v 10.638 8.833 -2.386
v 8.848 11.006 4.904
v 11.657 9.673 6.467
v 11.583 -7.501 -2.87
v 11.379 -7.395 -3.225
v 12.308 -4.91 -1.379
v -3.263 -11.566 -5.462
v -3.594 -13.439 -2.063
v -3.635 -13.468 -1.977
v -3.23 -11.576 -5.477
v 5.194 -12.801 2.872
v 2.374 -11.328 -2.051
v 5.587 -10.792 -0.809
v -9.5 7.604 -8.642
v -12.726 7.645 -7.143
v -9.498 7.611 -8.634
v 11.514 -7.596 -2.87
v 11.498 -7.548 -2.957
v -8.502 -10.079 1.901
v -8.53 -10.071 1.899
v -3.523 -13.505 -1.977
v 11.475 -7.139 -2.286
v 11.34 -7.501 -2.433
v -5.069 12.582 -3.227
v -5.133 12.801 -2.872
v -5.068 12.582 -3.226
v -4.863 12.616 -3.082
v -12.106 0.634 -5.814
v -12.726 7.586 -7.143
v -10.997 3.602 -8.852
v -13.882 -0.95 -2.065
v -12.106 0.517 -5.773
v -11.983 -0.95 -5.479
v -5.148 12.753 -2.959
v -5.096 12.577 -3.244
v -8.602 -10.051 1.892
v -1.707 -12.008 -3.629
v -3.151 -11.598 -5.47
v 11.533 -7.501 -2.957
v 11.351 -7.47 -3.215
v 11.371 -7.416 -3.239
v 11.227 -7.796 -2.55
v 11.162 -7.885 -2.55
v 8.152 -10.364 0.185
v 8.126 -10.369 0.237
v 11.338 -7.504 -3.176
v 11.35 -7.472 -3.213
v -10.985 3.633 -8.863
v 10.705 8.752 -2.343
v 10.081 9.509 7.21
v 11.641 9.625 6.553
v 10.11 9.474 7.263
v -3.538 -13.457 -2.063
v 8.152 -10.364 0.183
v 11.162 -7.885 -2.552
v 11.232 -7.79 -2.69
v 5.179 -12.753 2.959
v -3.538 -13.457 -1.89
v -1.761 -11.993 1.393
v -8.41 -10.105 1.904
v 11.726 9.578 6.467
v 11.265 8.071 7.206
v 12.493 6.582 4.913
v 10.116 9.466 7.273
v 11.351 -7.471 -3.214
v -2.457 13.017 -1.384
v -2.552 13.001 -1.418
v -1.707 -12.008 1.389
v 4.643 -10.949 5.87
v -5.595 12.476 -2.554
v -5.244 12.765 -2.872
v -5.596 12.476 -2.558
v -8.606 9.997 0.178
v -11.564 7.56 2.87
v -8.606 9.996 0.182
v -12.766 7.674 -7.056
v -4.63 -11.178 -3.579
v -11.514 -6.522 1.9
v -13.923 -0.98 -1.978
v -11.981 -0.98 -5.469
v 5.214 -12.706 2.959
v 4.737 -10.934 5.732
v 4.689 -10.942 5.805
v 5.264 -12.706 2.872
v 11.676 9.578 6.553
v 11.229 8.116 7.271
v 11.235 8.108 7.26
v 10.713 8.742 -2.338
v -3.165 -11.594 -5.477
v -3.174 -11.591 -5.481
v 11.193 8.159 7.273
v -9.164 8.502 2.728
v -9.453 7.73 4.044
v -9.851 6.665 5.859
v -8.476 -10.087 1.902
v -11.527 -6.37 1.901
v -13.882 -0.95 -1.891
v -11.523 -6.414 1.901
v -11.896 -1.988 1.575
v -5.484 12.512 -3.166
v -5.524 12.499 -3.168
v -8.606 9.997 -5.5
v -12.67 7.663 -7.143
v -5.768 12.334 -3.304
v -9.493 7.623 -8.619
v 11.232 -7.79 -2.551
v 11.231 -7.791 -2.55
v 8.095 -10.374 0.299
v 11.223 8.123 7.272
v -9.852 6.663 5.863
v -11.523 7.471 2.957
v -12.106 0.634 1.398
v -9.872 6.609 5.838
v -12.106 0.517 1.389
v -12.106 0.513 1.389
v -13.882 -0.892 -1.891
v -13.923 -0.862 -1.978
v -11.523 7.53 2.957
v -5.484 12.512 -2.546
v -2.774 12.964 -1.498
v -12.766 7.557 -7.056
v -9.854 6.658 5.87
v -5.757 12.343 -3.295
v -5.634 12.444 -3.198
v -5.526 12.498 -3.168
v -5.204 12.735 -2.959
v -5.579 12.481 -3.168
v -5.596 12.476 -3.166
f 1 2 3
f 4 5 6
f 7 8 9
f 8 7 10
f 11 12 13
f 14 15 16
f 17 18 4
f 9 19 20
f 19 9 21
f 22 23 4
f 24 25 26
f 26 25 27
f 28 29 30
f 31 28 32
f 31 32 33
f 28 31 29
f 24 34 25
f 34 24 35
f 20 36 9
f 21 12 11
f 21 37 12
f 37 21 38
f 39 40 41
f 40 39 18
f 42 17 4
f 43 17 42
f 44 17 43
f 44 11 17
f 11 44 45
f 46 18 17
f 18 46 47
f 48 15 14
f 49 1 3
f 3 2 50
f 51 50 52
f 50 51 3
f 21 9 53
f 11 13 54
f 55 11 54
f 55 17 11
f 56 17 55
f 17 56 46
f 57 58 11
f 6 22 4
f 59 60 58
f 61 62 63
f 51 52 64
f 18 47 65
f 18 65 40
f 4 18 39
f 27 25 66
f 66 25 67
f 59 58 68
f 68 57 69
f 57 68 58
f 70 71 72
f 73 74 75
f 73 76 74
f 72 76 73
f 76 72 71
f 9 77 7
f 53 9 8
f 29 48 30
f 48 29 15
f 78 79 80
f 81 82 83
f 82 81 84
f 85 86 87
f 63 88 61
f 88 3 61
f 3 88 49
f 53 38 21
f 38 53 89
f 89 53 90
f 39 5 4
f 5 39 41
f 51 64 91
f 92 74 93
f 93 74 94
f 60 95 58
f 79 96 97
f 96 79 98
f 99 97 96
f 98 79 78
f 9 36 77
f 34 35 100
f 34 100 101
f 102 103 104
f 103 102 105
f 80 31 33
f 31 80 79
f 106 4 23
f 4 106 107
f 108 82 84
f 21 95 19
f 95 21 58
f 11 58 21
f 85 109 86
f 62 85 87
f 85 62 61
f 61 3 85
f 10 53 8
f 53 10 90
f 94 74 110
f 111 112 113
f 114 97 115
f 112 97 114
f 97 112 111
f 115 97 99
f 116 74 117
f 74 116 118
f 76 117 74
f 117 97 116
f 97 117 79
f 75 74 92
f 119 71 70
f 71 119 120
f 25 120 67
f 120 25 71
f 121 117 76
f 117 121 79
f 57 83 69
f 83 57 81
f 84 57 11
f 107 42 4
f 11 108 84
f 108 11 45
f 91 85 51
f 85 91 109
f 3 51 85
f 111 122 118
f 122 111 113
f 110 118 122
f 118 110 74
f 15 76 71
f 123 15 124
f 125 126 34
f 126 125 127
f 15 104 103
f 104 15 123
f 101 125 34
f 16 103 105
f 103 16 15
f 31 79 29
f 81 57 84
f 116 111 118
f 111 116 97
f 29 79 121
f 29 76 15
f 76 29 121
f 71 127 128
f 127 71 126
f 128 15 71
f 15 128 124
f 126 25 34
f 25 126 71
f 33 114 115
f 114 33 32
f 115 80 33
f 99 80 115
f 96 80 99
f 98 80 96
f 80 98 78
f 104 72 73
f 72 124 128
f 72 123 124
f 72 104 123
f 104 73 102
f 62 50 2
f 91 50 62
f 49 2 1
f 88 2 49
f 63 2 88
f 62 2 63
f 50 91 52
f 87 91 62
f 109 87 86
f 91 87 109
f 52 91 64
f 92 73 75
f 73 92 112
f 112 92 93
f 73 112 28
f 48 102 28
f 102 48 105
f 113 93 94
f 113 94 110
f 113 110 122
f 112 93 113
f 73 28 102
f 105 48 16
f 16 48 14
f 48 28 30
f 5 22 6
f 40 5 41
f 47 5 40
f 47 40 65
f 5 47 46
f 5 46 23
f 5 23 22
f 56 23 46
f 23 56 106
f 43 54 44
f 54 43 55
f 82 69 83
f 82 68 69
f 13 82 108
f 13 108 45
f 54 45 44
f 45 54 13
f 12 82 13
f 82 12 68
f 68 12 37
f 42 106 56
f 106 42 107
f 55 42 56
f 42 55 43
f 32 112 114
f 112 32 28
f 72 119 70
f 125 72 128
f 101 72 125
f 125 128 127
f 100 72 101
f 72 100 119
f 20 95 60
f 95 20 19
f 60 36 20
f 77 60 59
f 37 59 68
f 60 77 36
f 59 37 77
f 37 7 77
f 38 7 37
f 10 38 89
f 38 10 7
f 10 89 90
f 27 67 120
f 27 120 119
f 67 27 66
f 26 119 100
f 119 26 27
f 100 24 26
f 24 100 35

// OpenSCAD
// Auto-generated OpenSCAD file

    inner_points = 10*[[-0.4820813211250987, -1.0449238650604131, -0.5104799034334353], [-0.052587296473702555, 1.0049095944004596, 1.060449642253799], [0.3132765628671369, -0.7900923074517557, -1.060449642253799], [0.7427705875185331, 1.259741152009117, 0.5104799034334353], [0.8121529711437319, -1.026904669604844, 0.4604304395233323], [0.9762050905955799, -0.24393795936757026, 1.060472132044425], [-0.7155158242021455, 0.4587552463162742, -1.060472132044425], [-0.5514637047502975, 1.241721956553548, -0.4604304395233323], [-0.6190335754244582, -0.5099059922176972, 1.010386278888689], [1.4632403980874105, 0.15725168700784506, -0.4294531901269253], [-1.2025511316939763, 0.05756559994085883, 0.4294531901269253], [0.8797228418178926, 0.7247232791664011, -1.010386278888689], [-0.1737587446246939, -1.191281953827171, 0.4294756799175514], [0.09168316057485429, 0.07558479539642826, 1.400363533083693], [1.1131573448949394, -0.7789558322102864, -0.4603940502776995], [1.3785992500944875, 0.487910917013313, 0.5104938028884421], [-1.1179099837010533, -0.27309363006460907, -0.5104938028884421], [-0.8524680785015052, 0.9937731191589904, 0.4603940502776995], [0.16900610581858003, 0.13923249155227563, -1.400363533083693], [0.43444801101812824, 1.406099240775875, -0.4294756799175514], [-1.1201047009544618, -0.9226987816684733, 0.249774787956858], [1.0980326190753988, -0.212010675559726, -1.284010728119616]];

    outer_points = 10*[[0.3553738060072703, 1.340954088422547, 0.19767924096673445], [0.5163570327909294, -1.270590953937949, 0.28722732116012484], [-0.5163570327909294, 1.270590953937949, -0.28722732116012484], [-0.3553738060072703, -1.340954088422547, -0.19767924096673445], [-0.6670731664763409, 0.4987607215152127, 1.1268436558827821], [-0.6055830454636154, -0.4987607215152127, 1.161047978889356], [0.6055830454636154, 0.4987607215152127, -1.161047978889356], [0.6670731664763409, -0.4987607215152127, -1.1268436558827821], [0.8980547740238846, 0.09210653881782889, 1.071699351461188], [-1.3841661909912581, -0.09210653881782889, -0.19780250955479217], [1.3841661909912581, 0.09210653881782889, 0.19780250955479217], [-0.8980547740238846, -0.09210653881782889, -1.071699351461188], [0.26222611273671315, 0.863936771240565, 1.0716231672840233], [0.36171921850764677, -0.7500868280895054, 1.1269669244708398], [-1.1482640134802296, 0.7500868280895054, 0.28702786839490235], [-1.048770907709296, -0.863936771240565, 0.34237162558171885], [1.048770907709296, 0.863936771240565, -0.34237162558171885], [1.1482640134802296, -0.7500868280895054, -0.28702786839490235], [-0.36171921850764677, 0.7500868280895054, -1.1269669244708398], [-0.26222611273671315, -0.863936771240565, -1.0716231672840233], [1.162572789567373, 0.9577836380236123, 0.6466894935006993], [-1.2685575801393754, 0.7615511020849973, -0.7056442971472661]];

    // Convex hull for inner set (I)
    module inner_hull() {
        hull() {
            for (p = inner_points) {
                translate(p) sphere(r=0.1);
            }
        }
    }

    // Convex hull for outer set (O) minus inner hull (O \ I)
    module outer_minus_inner() {
        difference() {
            hull() {
                for (p = outer_points) {
                    translate(p) sphere(r=0.1);
                }
            }
            inner_hull(); // Subtract inner hull
        }
    }

    // Convex hull for outer set (O) minus all translated inner hulls
    module outer_minus_AllTranslationInner() {
        difference() {
            hull() {
                for (p = outer_points) {
                    translate(p) sphere(r=0.1);
                }
            }
            hull() {
                translate([0,0,50]) inner_hull();
                translate([0,0,-50]) inner_hull();
            }; // Subtract translated inner hulls
        }
    }

    // Difference between outer_minus_inner and outer_minus_AllTranslationInner
    module outer_minus_inner_diff() {
        difference() {
            // Outer minus inner
            difference() {
                hull() {
                    for (p = outer_points) {
                        translate(p) sphere(r=0.1);
                    }
                }
                inner_hull();
            }

            // Subtract Outer minus AllTranslationInner
            difference() {
                hull() {
                    for (p = outer_points) {
                        translate(p) sphere(r=0.1);
                    }
                }
                hull() {
                    translate([0,0,50]) inner_hull();
                    translate([0,0,-50]) inner_hull();
                };
            }
        }
    }

    // Rendering all with colors applied
    color([0, 1, 0, 1]) outer_minus_AllTranslationInner(); // Opaque green
    
